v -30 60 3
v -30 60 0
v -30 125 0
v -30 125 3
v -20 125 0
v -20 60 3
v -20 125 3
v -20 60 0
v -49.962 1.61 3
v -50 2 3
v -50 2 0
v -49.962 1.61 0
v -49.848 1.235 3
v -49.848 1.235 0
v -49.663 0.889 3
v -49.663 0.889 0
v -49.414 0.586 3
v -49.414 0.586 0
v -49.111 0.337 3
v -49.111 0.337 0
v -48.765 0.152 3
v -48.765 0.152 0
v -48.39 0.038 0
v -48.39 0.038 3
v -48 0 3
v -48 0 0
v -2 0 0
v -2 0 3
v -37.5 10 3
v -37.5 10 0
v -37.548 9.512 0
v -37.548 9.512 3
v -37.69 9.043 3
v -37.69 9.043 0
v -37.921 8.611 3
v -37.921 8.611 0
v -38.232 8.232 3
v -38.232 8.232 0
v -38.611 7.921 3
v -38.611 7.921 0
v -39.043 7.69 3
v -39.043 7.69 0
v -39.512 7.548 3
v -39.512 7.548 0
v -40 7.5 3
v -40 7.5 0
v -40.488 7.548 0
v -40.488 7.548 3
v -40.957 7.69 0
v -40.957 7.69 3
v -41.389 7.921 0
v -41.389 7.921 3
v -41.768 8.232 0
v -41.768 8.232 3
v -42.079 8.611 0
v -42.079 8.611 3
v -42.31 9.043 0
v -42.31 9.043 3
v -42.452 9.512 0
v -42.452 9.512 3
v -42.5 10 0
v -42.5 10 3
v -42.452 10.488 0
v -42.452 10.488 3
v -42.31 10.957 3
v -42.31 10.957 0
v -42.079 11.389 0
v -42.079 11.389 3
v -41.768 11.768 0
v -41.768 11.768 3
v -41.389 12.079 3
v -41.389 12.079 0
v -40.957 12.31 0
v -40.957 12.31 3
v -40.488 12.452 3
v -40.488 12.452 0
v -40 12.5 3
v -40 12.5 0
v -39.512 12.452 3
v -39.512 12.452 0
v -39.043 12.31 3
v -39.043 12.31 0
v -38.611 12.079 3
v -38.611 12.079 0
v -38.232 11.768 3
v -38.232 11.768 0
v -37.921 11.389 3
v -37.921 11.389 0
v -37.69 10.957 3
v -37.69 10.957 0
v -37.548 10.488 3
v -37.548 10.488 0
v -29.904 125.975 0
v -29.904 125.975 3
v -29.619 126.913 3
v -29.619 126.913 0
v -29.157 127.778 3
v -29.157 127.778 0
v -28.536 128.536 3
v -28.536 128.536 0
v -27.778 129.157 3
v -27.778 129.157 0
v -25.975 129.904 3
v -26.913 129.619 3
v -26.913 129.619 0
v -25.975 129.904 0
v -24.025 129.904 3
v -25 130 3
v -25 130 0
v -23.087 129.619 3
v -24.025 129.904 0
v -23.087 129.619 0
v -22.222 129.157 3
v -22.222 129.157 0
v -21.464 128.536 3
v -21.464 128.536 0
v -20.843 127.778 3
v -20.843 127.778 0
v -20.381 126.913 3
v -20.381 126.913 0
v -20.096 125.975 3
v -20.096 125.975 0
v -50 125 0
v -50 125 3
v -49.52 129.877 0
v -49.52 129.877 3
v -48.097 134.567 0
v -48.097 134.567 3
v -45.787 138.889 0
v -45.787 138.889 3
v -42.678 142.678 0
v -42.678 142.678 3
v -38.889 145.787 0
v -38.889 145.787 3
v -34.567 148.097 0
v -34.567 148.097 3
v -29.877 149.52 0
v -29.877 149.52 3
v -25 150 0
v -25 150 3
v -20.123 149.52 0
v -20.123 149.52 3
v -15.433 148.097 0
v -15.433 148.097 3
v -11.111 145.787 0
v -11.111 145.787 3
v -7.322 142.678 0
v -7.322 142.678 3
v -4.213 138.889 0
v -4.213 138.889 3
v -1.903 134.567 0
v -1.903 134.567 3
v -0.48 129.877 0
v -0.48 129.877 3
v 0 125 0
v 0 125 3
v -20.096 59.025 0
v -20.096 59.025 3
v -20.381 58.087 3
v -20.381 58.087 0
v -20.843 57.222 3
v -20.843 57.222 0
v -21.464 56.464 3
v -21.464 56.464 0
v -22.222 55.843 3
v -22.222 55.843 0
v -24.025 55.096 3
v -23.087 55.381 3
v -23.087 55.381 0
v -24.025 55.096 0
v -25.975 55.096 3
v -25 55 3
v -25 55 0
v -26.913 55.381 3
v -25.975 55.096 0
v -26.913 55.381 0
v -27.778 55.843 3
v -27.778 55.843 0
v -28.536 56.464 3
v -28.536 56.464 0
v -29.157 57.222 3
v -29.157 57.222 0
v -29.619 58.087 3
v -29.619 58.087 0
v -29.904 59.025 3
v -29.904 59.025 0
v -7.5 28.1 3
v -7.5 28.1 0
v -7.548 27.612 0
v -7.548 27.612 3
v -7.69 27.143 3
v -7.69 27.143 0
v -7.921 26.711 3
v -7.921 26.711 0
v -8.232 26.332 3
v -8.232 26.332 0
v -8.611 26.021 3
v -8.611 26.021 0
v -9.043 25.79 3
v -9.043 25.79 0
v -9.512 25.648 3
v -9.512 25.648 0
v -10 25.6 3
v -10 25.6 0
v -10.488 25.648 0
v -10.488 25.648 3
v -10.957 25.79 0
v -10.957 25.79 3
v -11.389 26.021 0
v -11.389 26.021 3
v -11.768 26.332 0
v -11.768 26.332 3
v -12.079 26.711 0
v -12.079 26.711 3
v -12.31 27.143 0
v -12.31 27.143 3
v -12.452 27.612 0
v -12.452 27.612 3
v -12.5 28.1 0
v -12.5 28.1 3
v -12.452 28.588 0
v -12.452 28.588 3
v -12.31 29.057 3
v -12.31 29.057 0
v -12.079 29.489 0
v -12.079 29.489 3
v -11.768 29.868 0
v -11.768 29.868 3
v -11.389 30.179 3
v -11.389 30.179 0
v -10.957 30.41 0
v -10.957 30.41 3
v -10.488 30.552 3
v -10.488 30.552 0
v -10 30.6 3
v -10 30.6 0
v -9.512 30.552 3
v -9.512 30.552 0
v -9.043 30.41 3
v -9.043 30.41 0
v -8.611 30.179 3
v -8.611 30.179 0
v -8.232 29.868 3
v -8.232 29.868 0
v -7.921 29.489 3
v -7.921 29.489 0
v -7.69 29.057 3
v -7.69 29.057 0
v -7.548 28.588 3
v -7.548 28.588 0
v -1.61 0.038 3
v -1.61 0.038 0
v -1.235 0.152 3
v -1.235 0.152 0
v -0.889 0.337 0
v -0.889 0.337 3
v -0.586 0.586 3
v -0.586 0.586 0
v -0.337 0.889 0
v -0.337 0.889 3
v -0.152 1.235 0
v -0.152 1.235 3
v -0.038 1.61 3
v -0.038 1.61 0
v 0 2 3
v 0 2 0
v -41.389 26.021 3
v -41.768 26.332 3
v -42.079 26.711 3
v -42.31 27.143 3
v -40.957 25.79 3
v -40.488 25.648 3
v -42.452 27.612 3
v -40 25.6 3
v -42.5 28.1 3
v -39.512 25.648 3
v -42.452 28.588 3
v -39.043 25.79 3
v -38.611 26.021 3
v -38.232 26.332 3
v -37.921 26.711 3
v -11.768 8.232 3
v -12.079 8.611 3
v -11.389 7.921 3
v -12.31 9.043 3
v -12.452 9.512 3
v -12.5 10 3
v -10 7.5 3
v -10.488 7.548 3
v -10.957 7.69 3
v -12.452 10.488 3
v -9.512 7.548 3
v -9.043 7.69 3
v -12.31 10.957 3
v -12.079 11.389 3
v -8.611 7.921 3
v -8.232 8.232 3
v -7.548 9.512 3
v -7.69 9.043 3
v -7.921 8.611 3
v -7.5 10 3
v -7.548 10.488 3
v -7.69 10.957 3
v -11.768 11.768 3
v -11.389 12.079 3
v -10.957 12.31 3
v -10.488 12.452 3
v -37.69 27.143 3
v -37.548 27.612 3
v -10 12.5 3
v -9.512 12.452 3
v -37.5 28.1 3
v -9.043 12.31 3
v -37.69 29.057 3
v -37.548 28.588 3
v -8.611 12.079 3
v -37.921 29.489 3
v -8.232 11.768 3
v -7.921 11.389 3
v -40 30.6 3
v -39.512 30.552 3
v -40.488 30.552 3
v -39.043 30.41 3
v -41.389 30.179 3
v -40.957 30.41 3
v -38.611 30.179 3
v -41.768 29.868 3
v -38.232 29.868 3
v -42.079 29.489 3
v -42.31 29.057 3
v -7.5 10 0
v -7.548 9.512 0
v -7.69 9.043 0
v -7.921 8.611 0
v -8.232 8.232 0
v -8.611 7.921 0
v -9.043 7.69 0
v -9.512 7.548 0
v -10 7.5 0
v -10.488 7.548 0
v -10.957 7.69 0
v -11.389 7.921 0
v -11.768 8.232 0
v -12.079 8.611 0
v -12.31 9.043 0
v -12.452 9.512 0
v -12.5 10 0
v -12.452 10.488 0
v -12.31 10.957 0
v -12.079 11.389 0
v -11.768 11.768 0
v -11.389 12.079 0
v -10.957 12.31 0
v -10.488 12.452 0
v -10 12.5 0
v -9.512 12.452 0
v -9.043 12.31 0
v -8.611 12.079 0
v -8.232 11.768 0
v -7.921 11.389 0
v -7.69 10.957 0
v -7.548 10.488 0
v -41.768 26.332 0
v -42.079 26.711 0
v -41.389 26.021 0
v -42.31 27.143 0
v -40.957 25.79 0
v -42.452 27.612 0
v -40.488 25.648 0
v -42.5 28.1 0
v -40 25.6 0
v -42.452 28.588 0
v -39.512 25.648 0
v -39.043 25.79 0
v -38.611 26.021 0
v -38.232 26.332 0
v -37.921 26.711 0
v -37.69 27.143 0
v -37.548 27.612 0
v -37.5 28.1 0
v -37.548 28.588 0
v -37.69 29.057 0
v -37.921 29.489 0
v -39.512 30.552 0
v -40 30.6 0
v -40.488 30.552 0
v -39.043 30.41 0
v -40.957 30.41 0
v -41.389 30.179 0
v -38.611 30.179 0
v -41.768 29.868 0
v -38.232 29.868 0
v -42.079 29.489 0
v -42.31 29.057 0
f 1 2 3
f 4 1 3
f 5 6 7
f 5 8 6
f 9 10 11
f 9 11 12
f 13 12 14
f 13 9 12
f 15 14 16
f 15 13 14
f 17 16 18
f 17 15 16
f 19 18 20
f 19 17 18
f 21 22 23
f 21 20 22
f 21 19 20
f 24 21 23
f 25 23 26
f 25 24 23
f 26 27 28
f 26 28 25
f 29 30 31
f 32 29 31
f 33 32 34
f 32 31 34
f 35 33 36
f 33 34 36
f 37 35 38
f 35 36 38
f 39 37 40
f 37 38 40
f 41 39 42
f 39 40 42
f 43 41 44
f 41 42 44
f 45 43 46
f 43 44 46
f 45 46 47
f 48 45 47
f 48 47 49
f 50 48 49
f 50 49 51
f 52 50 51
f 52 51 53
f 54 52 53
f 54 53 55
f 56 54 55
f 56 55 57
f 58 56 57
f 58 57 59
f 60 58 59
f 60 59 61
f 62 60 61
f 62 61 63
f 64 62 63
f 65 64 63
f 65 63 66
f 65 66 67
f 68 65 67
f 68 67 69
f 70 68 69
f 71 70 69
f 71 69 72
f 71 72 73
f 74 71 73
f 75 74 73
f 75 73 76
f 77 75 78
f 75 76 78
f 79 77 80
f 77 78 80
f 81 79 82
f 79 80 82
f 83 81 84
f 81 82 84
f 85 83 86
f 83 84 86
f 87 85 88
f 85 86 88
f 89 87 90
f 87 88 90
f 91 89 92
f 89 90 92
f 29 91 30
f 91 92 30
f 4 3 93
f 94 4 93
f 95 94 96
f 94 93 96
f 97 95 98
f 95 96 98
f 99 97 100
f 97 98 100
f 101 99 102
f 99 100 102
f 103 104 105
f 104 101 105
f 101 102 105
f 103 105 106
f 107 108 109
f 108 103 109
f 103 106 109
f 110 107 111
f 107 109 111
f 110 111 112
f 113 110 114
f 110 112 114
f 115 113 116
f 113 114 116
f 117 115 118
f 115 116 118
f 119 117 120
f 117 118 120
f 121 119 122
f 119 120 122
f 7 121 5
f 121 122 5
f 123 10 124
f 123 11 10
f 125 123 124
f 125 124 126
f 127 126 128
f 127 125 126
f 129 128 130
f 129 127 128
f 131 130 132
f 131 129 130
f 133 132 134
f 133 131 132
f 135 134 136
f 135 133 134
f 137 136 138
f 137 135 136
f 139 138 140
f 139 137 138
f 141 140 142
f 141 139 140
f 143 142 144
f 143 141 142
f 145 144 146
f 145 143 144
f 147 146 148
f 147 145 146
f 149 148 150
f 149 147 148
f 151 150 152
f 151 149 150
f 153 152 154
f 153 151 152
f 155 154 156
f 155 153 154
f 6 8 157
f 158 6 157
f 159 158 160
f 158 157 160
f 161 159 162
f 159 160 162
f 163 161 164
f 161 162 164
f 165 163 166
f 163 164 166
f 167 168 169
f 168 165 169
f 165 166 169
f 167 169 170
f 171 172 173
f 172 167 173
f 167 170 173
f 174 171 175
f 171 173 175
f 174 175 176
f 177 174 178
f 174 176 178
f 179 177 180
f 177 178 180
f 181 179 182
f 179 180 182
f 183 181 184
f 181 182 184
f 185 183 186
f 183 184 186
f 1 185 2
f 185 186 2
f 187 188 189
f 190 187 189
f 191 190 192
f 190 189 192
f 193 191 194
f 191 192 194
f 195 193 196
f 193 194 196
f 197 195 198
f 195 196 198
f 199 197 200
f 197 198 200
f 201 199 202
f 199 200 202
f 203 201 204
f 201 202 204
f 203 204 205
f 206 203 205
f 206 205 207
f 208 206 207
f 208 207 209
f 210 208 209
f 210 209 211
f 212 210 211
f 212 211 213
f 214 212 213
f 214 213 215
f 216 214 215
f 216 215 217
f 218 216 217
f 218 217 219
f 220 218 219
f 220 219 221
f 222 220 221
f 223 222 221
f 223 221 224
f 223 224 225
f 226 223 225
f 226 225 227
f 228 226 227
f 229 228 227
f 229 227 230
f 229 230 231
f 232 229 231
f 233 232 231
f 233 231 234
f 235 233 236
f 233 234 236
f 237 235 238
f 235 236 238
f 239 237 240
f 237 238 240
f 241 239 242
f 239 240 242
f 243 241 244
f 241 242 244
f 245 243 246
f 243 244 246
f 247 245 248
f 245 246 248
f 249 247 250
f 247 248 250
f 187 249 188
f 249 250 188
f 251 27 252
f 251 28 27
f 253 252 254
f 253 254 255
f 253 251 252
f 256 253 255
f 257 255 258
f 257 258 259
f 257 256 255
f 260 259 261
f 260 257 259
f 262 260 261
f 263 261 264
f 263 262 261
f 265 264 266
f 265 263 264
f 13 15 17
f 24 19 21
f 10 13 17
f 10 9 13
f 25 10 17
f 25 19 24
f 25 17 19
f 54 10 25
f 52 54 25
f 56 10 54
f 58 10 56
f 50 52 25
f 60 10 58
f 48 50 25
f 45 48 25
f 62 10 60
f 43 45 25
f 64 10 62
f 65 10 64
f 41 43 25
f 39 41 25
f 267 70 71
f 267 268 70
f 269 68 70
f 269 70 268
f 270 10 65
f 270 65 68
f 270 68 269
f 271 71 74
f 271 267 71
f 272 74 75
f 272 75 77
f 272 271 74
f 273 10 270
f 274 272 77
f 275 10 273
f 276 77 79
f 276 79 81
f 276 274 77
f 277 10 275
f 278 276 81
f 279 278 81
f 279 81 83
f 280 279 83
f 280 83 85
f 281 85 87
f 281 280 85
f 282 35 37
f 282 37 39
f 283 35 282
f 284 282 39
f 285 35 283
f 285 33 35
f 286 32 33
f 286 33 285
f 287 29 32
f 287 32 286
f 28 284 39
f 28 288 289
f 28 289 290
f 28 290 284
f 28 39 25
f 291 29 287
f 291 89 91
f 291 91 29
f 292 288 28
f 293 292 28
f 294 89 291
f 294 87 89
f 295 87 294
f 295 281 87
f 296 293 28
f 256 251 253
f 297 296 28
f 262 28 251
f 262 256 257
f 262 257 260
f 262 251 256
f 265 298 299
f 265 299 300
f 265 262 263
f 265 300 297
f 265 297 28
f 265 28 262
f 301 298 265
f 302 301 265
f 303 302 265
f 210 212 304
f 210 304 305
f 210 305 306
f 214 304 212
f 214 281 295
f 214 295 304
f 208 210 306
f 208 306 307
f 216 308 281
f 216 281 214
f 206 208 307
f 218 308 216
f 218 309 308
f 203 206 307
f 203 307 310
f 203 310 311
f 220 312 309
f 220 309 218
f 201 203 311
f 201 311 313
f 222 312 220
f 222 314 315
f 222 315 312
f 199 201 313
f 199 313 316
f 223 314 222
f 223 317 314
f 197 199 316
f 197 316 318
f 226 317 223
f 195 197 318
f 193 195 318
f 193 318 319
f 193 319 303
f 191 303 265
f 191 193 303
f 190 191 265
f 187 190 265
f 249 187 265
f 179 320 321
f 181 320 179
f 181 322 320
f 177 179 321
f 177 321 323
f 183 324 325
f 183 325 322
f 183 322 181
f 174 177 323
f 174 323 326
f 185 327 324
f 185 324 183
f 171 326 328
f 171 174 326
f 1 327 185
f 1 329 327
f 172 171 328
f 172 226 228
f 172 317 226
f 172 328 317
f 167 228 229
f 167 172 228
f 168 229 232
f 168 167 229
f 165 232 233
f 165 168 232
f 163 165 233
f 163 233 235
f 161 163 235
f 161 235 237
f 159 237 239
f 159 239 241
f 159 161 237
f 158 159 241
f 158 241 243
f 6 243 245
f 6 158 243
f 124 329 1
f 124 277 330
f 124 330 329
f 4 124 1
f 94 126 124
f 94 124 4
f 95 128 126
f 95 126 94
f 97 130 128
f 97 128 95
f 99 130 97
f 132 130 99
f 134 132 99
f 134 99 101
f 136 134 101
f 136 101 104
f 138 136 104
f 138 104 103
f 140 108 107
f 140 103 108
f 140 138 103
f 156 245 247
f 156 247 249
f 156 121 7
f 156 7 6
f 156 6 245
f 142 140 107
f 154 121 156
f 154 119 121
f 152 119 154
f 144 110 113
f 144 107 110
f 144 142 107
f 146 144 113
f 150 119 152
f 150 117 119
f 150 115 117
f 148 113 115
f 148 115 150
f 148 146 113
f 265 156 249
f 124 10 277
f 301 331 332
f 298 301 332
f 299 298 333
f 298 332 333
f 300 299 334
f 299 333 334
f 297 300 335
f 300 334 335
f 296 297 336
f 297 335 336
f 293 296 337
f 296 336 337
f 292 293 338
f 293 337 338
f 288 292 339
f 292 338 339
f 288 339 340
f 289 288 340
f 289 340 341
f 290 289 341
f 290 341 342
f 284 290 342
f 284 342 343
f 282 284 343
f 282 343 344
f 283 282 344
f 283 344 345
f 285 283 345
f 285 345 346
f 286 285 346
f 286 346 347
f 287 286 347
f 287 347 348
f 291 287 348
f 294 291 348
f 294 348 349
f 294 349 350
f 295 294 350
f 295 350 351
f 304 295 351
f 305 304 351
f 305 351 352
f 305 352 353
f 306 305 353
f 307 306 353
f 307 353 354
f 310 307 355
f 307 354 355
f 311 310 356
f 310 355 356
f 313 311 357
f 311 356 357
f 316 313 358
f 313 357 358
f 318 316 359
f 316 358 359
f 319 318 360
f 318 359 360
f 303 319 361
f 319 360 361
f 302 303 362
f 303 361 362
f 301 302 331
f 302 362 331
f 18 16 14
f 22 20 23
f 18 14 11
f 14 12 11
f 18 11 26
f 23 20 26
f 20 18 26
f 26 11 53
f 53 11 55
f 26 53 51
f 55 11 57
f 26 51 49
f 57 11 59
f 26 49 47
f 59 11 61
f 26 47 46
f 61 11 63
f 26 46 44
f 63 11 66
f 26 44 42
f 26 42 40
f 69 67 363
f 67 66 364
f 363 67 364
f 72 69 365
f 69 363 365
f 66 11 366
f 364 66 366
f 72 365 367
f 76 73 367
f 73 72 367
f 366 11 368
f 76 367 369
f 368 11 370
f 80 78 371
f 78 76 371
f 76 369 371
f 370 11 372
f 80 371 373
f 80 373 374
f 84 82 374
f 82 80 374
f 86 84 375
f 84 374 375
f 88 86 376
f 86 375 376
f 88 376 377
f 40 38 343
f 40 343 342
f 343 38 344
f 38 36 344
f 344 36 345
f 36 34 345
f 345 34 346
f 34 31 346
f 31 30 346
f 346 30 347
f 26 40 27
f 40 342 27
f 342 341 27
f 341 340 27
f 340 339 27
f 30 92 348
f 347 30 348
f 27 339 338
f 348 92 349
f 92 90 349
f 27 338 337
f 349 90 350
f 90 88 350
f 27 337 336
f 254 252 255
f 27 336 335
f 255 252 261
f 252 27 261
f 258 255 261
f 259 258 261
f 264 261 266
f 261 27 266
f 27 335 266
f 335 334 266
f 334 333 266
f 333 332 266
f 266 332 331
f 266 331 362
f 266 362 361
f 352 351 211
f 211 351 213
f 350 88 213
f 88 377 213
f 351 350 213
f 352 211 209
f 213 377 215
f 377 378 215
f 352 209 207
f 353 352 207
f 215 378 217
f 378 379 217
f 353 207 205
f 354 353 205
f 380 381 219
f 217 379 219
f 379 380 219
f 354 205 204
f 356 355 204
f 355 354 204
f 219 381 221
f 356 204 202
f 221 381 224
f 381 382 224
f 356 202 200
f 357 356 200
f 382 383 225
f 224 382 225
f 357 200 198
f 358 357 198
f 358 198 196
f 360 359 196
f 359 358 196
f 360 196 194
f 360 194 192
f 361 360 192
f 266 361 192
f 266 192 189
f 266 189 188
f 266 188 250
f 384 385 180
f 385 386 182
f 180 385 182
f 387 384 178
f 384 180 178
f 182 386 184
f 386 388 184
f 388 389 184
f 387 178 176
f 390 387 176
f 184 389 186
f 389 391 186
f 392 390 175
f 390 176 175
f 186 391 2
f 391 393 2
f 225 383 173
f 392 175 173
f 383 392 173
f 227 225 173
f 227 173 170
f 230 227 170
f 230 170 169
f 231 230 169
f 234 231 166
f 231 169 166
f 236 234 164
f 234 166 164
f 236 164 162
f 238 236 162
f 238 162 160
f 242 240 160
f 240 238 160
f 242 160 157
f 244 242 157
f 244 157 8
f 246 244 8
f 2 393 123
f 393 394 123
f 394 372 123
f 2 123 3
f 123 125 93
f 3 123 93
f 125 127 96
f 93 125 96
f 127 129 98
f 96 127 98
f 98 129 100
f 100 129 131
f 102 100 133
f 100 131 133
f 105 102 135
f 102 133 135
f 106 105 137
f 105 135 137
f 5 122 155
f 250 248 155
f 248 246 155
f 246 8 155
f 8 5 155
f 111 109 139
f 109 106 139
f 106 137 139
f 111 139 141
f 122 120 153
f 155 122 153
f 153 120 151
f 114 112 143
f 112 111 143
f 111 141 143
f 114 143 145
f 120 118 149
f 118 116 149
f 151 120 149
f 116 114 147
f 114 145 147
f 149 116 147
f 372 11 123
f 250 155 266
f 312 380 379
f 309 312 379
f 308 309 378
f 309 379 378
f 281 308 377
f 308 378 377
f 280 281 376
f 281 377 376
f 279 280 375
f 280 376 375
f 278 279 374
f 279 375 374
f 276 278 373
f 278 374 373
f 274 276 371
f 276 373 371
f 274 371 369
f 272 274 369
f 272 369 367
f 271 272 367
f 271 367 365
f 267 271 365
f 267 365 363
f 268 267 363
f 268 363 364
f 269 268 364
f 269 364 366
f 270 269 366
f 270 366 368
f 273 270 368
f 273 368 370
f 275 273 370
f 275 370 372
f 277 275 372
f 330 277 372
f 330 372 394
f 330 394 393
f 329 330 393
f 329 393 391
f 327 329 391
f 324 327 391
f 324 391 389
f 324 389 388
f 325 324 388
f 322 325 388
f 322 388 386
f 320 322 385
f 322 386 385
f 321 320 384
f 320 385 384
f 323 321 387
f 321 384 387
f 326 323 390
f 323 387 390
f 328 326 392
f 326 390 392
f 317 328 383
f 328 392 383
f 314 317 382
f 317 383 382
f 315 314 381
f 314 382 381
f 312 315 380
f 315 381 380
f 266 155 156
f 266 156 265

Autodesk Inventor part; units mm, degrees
ref_plane "YZ Plane" through (0, 0, 0) normal (1, 0, 0) x (0, 1, 0)
ref_plane "XZ Plane" through (0, 0, 0) normal (0, 1, 0) x (-1, 0, 0)
ref_plane "XY Plane" through (0, 0, 0) normal (0, 0, 1) x (1, 0, 0)
sketch "Boceto1" plane through (0, 0, 0) normal (0, 0, 1) x (1, 0, 0)
  line L0 (0, 0) -> (-50, 0)
  line L1 (-50, 0) -> (-50, 125)
  line L2 (0, 125) -> (0, 0)
  arc A0 (0, 125) -> (-50, 125) centre (-25, 125) ccw
  arc A1 (-20, 125) -> (-30, 125) centre (-25, 125) ccw
  line L3 (-25, 67.5) -> (-25, 60)
  arc A2 (-30, 60) -> (-20, 60) centre (-25, 60) ccw
  line L4 (-30, 60) -> (-30, 125)
  line L5 (-20, 60) -> (-20, 125)
  line L6 (0, 0) -> (-50, 0)
  line L7 (-50, 0) -> (-50, 38.1)
  line L8 (-50, 38.1) -> (0, 38.1)
  line L9 (0, 38.1) -> (0, 0)
  line L10 (-10, 28.1) -> (-40, 28.1)
  line L11 (-40, 28.1) -> (-40, 10)
  line L12 (-40, 10) -> (-10, 10)
  line L13 (-10, 10) -> (-10, 28.1)
  circle A3 centre (-40, 28.1) radius 2.5
  circle A4 centre (-10, 28.1) radius 2.5
  circle A5 centre (-40, 10) radius 2.5
  circle A6 centre (-10, 10) radius 2.5
  point P0 (-12.5, 10)
  point P1 (-10, 12.5)
  point P2 (-10, 25.6)
  point P3 (-12.5, 28.1)
  point P4 (-37.5, 28.1)
  point P5 (-40, 25.6)
  point P6 (-40, 12.5)
  point P7 (-37.5, 10)
  dimension "d2" = 10
  dimension "d3" = 65
  dimension "d4" = 10
  dimension "d5" = 38.1
  dimension "d6" = 10
  dimension "d7" = 5
  dimension "d8" = 5
  dimension "d9" = 5
  dimension "d10" = 5
extrude "Extrusión1" add sketch "Boceto1" along normal blind 3 contours L0 L1 L8 L2 | L8 L1 A0 L2 | L5 A2 L4 A1 | A3 L11 L10 | L10 L11 A3 | L10 A4 L13 A6 L12 A5 L11 A3 | A4 L13 L10 | L10 L13 A4 | A5 L12 L11 | L11 L12 A5 | A6 L12 L13 | L13 L12 A6
fillet "Empalme1" radius 2 2 edges at (0, 0, 1.5) (-50, 0, 1.5)
extrude "Extrusión2" cut sketch "Boceto1" along normal blind 3 contours L5 A2 L4 A1 | A3 L11 L10 | L10 L11 A3 | A4 L13 L10 | L10 L13 A4 | A5 L12 L11 | L11 L12 A5 | A6 L12 L13 | L13 L12 A6
